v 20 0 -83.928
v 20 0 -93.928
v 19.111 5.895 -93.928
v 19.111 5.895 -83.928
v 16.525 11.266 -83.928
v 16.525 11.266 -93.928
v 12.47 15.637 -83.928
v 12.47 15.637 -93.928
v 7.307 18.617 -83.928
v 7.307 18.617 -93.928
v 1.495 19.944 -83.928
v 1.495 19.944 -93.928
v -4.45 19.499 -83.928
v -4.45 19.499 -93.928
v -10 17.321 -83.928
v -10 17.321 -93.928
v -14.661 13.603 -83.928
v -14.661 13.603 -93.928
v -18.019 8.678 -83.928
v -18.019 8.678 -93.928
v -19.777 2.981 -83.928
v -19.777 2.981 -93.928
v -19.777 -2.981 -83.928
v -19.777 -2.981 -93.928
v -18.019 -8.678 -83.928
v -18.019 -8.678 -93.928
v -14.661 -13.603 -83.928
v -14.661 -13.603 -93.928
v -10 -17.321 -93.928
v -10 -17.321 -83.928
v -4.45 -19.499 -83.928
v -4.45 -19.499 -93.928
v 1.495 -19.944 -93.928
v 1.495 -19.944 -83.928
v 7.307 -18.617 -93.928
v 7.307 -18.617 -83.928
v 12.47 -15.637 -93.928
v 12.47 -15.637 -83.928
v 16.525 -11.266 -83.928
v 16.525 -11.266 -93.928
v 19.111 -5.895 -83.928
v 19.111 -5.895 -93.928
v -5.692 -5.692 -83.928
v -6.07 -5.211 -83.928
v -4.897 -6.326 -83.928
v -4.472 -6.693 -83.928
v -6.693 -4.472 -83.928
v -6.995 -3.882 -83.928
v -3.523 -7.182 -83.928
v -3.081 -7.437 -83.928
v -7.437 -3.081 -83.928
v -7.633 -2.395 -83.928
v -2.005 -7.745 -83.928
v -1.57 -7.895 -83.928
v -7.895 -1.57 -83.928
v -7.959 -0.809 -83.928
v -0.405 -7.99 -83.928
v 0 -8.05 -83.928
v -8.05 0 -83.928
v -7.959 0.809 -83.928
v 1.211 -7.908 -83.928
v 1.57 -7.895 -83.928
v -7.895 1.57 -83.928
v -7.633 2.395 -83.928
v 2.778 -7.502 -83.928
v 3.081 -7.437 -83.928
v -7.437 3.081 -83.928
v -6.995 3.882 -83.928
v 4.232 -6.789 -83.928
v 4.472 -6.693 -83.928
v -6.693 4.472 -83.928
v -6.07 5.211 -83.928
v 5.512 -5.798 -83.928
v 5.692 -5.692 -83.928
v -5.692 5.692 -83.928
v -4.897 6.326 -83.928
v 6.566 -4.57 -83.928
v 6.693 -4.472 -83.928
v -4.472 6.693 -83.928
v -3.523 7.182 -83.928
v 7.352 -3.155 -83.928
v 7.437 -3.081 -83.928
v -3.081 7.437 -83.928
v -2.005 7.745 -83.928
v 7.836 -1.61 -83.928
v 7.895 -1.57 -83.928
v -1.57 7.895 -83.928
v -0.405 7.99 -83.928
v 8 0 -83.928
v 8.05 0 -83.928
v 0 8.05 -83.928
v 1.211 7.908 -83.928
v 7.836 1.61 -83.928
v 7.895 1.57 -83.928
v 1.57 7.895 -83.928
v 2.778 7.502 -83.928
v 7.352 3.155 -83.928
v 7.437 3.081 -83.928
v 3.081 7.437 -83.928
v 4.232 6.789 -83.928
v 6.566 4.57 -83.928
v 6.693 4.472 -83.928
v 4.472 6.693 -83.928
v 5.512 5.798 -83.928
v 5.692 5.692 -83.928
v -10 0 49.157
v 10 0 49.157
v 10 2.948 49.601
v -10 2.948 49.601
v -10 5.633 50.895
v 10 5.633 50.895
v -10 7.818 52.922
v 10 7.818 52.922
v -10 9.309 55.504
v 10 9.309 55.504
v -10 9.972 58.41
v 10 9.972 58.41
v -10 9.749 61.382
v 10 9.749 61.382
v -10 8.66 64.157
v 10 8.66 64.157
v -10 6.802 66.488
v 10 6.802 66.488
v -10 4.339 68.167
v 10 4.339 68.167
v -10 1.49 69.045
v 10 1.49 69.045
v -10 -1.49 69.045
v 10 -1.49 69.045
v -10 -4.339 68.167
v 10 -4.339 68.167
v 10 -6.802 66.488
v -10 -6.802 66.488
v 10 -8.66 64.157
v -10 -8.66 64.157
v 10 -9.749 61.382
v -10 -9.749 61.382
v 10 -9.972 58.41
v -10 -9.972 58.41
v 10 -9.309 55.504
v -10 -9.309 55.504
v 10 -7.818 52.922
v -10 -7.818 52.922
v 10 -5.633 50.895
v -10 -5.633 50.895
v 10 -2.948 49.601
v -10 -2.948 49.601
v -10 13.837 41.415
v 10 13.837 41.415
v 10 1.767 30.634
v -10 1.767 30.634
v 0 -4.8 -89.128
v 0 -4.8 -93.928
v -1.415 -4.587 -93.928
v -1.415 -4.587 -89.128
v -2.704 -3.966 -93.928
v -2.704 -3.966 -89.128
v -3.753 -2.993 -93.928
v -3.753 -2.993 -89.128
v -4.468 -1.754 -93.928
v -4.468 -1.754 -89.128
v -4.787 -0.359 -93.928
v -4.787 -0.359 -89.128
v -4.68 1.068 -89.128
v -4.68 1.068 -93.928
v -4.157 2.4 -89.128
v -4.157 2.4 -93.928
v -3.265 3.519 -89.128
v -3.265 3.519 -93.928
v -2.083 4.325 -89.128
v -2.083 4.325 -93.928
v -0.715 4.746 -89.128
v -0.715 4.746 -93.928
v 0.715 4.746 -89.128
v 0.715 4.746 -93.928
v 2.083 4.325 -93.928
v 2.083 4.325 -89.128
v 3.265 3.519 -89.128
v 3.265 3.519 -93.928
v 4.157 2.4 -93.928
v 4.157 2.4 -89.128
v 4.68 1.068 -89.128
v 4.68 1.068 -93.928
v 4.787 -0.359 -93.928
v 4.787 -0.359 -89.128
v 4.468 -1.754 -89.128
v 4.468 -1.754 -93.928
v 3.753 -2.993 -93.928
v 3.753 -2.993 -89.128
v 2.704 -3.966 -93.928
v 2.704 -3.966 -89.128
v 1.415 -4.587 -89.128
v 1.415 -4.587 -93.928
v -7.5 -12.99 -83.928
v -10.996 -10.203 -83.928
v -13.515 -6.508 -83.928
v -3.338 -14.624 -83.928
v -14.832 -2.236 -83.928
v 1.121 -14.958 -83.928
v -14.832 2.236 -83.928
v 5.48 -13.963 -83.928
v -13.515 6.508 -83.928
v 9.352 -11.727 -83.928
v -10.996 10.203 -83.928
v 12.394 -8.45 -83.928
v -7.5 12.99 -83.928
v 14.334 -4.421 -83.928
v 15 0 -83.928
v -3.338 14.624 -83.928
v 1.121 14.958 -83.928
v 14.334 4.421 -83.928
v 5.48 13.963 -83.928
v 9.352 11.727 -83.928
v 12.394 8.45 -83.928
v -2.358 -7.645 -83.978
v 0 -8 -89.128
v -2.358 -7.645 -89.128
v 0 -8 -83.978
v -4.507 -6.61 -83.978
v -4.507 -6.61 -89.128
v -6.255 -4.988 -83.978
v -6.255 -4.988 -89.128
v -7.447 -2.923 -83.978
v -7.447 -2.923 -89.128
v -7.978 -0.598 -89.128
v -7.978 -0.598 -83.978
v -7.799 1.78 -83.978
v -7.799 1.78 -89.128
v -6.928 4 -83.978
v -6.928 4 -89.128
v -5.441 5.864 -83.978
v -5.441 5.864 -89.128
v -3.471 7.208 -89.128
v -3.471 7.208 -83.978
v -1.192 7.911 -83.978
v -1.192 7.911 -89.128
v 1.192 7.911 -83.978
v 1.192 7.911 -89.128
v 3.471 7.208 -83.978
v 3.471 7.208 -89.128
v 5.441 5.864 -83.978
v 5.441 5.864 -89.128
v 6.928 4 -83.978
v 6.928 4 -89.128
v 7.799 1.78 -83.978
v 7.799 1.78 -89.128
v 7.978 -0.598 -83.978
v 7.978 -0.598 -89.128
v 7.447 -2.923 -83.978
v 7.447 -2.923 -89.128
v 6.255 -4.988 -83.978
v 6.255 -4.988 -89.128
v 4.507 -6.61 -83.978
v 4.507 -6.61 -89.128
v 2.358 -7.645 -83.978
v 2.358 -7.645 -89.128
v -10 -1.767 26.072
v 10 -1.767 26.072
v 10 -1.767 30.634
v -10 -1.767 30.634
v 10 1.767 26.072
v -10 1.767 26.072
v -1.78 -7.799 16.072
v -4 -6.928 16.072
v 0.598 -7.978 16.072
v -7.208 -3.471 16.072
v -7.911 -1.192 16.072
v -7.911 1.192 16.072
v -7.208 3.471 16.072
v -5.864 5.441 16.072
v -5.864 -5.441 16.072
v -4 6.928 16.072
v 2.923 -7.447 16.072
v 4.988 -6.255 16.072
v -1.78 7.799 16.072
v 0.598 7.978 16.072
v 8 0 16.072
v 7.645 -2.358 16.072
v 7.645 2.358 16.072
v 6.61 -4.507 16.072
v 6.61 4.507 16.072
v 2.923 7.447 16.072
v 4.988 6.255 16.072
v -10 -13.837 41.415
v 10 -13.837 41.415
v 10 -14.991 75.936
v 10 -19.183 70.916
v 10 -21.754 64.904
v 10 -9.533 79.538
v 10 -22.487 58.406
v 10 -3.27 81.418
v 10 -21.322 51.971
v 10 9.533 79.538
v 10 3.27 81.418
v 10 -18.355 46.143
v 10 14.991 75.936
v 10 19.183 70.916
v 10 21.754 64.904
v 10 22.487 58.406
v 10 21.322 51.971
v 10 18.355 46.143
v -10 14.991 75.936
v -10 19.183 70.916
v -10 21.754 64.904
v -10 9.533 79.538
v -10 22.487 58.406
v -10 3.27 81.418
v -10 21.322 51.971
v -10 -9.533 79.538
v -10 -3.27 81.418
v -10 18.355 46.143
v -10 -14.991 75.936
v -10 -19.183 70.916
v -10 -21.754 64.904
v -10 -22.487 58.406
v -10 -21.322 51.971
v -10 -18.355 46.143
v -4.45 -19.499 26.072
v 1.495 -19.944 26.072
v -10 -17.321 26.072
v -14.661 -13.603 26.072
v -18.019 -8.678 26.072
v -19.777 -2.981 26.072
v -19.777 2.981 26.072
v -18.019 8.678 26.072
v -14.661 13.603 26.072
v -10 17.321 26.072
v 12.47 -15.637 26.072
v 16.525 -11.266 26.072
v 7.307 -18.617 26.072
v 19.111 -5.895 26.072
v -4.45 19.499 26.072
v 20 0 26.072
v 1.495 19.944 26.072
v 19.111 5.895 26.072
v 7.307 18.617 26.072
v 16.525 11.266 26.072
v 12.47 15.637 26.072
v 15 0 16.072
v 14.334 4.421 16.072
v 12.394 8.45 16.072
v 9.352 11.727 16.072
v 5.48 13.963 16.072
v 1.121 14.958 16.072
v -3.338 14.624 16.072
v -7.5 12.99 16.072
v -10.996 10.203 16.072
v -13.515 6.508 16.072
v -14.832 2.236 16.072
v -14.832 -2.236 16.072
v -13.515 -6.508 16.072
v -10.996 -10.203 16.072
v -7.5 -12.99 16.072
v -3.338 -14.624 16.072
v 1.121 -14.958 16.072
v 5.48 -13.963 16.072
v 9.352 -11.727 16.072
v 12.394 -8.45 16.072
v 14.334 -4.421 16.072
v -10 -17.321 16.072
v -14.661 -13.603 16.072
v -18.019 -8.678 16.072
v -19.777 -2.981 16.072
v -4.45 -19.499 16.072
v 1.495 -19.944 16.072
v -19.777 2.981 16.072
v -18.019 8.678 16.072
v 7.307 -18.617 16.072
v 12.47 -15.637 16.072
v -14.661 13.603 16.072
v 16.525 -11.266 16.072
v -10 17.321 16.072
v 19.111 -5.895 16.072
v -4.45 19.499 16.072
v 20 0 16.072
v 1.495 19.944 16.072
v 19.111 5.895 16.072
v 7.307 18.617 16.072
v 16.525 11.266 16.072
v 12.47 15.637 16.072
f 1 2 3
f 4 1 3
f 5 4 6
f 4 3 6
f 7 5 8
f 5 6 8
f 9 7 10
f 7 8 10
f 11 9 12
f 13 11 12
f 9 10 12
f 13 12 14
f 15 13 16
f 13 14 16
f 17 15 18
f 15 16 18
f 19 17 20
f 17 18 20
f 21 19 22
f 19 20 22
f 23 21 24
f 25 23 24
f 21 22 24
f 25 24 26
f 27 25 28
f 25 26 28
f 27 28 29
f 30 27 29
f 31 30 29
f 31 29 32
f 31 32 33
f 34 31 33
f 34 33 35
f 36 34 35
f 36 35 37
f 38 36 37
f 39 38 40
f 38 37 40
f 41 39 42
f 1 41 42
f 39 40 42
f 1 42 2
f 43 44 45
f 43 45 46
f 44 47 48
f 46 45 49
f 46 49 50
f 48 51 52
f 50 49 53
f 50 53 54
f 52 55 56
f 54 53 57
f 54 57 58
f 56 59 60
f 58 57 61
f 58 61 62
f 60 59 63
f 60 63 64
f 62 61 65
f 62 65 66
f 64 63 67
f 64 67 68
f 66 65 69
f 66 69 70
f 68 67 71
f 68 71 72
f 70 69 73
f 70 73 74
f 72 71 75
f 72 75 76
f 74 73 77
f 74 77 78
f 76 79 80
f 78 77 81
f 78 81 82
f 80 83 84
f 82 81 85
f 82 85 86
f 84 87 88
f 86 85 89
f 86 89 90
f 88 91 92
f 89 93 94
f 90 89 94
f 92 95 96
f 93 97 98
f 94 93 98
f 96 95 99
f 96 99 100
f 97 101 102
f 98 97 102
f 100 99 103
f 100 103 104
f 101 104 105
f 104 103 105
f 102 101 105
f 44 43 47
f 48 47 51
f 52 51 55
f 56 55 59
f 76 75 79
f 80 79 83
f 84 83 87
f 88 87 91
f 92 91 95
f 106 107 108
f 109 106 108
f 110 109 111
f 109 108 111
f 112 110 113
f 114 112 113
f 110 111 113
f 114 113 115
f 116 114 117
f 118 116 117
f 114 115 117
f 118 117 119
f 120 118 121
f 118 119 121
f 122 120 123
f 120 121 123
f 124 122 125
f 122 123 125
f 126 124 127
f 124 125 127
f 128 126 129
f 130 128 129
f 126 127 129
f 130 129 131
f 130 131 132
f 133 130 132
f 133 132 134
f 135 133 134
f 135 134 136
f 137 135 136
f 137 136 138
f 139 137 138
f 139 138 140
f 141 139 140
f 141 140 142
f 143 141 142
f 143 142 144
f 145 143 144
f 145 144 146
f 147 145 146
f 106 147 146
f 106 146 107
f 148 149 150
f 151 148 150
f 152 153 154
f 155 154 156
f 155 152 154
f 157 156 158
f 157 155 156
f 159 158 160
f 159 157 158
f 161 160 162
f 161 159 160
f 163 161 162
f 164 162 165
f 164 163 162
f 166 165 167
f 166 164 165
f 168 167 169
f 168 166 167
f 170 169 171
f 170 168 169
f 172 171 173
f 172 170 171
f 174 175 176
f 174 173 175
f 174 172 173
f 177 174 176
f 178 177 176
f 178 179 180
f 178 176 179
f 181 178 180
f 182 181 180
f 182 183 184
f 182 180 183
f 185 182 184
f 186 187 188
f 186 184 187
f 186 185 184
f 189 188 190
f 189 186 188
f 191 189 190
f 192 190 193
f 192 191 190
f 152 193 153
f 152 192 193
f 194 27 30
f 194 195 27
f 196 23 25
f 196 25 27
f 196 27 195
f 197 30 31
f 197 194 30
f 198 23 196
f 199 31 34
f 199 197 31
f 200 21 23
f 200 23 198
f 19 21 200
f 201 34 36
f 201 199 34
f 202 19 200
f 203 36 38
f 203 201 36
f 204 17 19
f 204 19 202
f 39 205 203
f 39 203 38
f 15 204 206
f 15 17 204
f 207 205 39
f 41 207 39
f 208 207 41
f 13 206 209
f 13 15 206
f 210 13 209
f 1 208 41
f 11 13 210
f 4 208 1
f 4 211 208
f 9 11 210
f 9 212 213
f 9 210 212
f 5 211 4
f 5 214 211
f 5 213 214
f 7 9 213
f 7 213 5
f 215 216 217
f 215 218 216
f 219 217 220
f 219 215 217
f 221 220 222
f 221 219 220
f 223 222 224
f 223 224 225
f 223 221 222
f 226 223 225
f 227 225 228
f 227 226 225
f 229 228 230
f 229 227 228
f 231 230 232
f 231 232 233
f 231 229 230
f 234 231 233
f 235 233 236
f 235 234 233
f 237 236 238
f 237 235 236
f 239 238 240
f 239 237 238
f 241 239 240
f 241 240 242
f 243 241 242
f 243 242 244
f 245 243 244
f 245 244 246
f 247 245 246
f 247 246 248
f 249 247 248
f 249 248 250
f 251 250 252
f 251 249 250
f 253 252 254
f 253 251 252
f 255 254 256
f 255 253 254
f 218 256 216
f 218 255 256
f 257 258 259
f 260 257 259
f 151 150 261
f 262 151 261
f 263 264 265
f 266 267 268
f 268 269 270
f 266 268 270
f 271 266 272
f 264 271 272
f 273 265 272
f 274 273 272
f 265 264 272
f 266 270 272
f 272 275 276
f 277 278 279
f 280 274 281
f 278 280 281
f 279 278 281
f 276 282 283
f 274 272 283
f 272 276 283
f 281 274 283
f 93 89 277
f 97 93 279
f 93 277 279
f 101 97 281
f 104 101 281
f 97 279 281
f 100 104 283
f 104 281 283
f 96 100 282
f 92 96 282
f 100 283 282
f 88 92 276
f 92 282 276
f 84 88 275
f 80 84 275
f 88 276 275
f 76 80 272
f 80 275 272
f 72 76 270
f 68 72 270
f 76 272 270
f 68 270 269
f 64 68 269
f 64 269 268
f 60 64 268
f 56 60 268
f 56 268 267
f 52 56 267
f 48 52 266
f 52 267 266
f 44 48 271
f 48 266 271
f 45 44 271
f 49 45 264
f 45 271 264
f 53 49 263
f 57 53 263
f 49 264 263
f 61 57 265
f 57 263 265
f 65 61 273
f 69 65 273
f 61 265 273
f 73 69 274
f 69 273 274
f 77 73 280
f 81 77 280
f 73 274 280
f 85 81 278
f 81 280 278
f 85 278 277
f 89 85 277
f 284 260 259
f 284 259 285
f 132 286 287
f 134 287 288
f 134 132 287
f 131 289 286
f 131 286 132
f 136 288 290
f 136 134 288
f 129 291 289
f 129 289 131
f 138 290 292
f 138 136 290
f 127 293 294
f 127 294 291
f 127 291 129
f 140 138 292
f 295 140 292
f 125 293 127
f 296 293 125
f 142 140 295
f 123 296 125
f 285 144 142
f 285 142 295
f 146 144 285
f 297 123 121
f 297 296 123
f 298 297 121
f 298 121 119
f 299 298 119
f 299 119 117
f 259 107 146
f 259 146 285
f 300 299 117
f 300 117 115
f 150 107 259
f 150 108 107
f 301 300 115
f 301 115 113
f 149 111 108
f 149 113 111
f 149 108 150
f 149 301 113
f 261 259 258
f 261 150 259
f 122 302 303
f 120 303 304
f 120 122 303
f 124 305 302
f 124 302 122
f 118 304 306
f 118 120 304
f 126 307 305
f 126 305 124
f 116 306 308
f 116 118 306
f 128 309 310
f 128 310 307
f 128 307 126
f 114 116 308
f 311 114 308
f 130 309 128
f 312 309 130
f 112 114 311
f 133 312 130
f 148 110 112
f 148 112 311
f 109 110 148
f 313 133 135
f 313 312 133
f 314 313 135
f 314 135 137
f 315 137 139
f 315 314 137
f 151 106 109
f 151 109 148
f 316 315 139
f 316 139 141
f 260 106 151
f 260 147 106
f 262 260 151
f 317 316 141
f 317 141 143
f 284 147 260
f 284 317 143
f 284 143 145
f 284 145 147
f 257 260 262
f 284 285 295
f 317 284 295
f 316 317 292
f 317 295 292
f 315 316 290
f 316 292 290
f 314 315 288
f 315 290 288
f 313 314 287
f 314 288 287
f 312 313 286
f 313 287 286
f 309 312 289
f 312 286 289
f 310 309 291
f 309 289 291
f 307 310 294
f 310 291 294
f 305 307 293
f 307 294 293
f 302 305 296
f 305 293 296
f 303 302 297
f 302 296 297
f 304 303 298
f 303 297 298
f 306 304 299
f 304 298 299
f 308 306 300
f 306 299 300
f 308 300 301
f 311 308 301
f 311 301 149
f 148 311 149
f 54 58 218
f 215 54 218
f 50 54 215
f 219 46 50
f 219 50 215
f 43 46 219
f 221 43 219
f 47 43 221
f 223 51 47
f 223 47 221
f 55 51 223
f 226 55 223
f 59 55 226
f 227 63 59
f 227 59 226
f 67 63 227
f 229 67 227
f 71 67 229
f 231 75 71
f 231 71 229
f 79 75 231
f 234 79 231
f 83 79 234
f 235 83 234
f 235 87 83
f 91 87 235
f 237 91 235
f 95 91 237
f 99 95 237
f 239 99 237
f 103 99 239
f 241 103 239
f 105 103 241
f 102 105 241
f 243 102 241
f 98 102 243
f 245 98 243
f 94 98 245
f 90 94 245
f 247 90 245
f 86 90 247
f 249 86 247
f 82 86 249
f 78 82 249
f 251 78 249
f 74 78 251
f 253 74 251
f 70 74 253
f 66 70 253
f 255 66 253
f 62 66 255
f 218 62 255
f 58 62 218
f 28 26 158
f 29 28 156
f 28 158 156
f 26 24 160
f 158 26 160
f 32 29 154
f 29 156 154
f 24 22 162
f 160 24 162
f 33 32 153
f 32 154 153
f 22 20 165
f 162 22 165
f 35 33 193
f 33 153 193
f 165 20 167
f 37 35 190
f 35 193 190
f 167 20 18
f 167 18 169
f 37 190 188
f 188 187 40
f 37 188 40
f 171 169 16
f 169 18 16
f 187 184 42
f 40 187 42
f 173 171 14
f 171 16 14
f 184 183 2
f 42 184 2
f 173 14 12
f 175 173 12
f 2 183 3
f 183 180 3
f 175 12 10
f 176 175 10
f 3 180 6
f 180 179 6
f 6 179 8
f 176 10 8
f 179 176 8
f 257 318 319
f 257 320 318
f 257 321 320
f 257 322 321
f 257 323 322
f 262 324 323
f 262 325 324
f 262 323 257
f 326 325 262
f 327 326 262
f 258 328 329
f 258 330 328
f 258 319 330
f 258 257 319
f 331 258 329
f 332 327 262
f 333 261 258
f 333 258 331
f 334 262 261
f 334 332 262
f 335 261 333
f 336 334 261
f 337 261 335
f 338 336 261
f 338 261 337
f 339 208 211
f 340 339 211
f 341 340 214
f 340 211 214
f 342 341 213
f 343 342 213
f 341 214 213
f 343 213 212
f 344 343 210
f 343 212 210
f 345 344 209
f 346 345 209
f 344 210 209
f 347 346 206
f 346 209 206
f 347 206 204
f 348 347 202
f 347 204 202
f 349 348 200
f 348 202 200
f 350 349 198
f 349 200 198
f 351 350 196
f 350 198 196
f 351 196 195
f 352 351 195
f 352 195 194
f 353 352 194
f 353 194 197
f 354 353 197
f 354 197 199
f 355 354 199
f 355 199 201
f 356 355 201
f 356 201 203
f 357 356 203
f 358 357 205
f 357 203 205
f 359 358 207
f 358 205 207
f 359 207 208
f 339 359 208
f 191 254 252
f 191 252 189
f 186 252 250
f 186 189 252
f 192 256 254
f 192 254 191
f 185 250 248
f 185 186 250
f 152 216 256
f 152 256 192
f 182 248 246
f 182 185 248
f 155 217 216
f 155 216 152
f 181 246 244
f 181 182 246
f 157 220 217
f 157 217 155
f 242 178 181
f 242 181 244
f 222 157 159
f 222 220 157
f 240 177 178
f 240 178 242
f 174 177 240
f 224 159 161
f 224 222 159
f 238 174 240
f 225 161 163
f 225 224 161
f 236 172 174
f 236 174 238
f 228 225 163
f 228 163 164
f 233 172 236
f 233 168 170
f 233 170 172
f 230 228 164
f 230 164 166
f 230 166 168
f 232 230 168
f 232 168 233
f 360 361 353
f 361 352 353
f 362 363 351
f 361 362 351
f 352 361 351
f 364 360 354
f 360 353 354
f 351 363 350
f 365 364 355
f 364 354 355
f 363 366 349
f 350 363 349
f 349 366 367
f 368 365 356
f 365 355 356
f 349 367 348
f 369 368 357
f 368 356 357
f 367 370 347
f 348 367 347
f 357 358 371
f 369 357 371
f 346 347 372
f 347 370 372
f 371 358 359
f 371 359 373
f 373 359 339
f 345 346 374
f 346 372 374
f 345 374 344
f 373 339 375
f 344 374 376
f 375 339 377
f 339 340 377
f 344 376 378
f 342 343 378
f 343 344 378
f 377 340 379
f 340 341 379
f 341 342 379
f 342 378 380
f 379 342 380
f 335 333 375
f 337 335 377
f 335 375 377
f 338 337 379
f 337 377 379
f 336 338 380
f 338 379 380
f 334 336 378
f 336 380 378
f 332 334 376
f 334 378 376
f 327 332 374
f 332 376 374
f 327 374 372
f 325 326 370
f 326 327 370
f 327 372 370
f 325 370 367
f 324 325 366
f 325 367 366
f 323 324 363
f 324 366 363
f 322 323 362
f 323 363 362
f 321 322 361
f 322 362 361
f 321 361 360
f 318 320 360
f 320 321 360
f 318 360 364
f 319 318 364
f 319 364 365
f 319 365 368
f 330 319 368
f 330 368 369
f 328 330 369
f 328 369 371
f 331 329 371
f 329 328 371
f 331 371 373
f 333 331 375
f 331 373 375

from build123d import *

# Parameters (mm, degrees)
SKETCH3_R           = 10
BOSS_EXTRUDE3_DEPTH = 5
SKETCH16_R          = 7.5
BOSS_EXTRUDE7_DEPTH = 50
SKETCH19_R          = 4
CUT_EXTRUDE3_DEPTH  = 50
SKETCH20_R          = 10
BOSS_EXTRUDE8_DEPTH = 5
SKETCH21_W          = 103.138410702
SKETCH21_H          = 76.113402372
BOSS_EXTRUDE9_DEPTH = 70
SCALE1_SCALE        = 2
SKETCH31_R          = 10
CUT_EXTRUDE11_DEPTH = 207.276821406
SKETCH32_W          = 93.138410703
SKETCH32_H          = 55.584947452
CUT_EXTRUDE12_DEPTH = 40


with BuildPart() as part:
    # Sketch3 → Boss-Extrude3 (new body)
    with BuildSketch(Plane.XY):
        Circle(SKETCH3_R)
    extrude(amount=BOSS_EXTRUDE3_DEPTH)

    # Sketch14 → CBORE for M4 Cheese Head Screw1 (revolve, cut)
    with BuildSketch(Plane(origin=(0, 0, 5), x_dir=(0, -1, 0), z_dir=(1, 0, 0))):
        Polygon((0, 0), (0, 8.942065486), (2.4, 7.5), (2.4, 2.6), (4, 2.6), (4, 0.025), (4.025, 0), align=None)
    revolve(axis=Axis((0, 0, 11.35), (0, 0, -1)), mode=Mode.SUBTRACT)

    # Sketch16 → Boss-Extrude7 (add)
    with BuildSketch(Plane.XY.offset(5)):
        Circle(SKETCH16_R)
    extrude(amount=BOSS_EXTRUDE7_DEPTH)

    # Sketch19 → Cut-Extrude3 (cut)
    with BuildSketch(Plane.XY.offset(55)):
        Circle(SKETCH19_R)
    extrude(amount=-CUT_EXTRUDE3_DEPTH, mode=Mode.SUBTRACT)

    # Sketch20 → Boss-Extrude8 (add)
    with BuildSketch(Plane.XY.offset(55)):
        Circle(SKETCH20_R)
    extrude(amount=BOSS_EXTRUDE8_DEPTH)

    # Sketch21 → Boss-Extrude9 (add)
    with BuildSketch(Plane.XY.offset(60)):
        Rectangle(SKETCH21_W, SKETCH21_H)
    extrude(amount=BOSS_EXTRUDE9_DEPTH)


with BuildPart() as part_1:
    # Scale1: scaled about (0, 0, 93.927789278)
    add(part.part.scale(SCALE1_SCALE).moved(Location((0, 0, -93.927789278))))

    # Sketch31 → Cut-Extrude11 (cut, through all)
    with BuildSketch(Plane(origin=(103.138410703, 0, 0), x_dir=(0, 0, -1), z_dir=(1, 0, 0))):
        with BuildLine():
            Line((-30.633863687, 1.766654317), (-26.072210722, 1.766654317))
            Line((-26.072210722, 1.766654317), (-26.072210722, 76.113402371))
            Line((-26.072210722, 76.113402371), (-166.072210722, 76.113402371))
            Line((-166.072210722, 76.113402371), (-166.072210722, -76.113402371))
            Line((-166.072210722, -76.113402371), (-26.072210722, -76.113402371))
            Line((-26.072210722, -76.113402371), (-26.072210722, -1.766654317))
            Line((-26.072210722, -1.766654317), (-30.633863687, -1.766654317))
            Line((-30.633863687, -1.766654317), (-41.414995548, -13.837111886))
            ThreePointArc((-41.414995548, -13.837111886), (-81.657158174, 0), (-41.414995548, 13.837111886))
            Line((-41.414995548, 13.837111886), (-30.633863687, 1.766654317))
        make_face()
        Polygon((-166.072210722, 76.113402371), (-26.072210722, 76.113402371), (-26.072210722, 93.777305116), (-178.92688661, 93.777305116), (-178.92688661, -90.381530622), (-26.072210722, -90.381530622), (-26.072210722, -76.113402371), (-166.072210722, -76.113402371), align=None)
        with Locations((-59.157158174, 0)):
            Circle(SKETCH31_R)
    extrude(amount=-CUT_EXTRUDE11_DEPTH, mode=Mode.SUBTRACT)

    # Sketch32 → Cut-Extrude12 (cut, symmetric)
    with BuildSketch(Plane(origin=(0, 1.766654317, 0), x_dir=(1, 0, 0), z_dir=(0, 1, 0))):
        with Locations((-56.569205352, -53.864684448)):
            Rectangle(SKETCH32_W, SKETCH32_H)
        with Locations((56.569205352, -53.864684448)):
            Rectangle(SKETCH32_W, SKETCH32_H)
    extrude(amount=CUT_EXTRUDE12_DEPTH, both=True, mode=Mode.SUBTRACT)


solid = part_1.part
